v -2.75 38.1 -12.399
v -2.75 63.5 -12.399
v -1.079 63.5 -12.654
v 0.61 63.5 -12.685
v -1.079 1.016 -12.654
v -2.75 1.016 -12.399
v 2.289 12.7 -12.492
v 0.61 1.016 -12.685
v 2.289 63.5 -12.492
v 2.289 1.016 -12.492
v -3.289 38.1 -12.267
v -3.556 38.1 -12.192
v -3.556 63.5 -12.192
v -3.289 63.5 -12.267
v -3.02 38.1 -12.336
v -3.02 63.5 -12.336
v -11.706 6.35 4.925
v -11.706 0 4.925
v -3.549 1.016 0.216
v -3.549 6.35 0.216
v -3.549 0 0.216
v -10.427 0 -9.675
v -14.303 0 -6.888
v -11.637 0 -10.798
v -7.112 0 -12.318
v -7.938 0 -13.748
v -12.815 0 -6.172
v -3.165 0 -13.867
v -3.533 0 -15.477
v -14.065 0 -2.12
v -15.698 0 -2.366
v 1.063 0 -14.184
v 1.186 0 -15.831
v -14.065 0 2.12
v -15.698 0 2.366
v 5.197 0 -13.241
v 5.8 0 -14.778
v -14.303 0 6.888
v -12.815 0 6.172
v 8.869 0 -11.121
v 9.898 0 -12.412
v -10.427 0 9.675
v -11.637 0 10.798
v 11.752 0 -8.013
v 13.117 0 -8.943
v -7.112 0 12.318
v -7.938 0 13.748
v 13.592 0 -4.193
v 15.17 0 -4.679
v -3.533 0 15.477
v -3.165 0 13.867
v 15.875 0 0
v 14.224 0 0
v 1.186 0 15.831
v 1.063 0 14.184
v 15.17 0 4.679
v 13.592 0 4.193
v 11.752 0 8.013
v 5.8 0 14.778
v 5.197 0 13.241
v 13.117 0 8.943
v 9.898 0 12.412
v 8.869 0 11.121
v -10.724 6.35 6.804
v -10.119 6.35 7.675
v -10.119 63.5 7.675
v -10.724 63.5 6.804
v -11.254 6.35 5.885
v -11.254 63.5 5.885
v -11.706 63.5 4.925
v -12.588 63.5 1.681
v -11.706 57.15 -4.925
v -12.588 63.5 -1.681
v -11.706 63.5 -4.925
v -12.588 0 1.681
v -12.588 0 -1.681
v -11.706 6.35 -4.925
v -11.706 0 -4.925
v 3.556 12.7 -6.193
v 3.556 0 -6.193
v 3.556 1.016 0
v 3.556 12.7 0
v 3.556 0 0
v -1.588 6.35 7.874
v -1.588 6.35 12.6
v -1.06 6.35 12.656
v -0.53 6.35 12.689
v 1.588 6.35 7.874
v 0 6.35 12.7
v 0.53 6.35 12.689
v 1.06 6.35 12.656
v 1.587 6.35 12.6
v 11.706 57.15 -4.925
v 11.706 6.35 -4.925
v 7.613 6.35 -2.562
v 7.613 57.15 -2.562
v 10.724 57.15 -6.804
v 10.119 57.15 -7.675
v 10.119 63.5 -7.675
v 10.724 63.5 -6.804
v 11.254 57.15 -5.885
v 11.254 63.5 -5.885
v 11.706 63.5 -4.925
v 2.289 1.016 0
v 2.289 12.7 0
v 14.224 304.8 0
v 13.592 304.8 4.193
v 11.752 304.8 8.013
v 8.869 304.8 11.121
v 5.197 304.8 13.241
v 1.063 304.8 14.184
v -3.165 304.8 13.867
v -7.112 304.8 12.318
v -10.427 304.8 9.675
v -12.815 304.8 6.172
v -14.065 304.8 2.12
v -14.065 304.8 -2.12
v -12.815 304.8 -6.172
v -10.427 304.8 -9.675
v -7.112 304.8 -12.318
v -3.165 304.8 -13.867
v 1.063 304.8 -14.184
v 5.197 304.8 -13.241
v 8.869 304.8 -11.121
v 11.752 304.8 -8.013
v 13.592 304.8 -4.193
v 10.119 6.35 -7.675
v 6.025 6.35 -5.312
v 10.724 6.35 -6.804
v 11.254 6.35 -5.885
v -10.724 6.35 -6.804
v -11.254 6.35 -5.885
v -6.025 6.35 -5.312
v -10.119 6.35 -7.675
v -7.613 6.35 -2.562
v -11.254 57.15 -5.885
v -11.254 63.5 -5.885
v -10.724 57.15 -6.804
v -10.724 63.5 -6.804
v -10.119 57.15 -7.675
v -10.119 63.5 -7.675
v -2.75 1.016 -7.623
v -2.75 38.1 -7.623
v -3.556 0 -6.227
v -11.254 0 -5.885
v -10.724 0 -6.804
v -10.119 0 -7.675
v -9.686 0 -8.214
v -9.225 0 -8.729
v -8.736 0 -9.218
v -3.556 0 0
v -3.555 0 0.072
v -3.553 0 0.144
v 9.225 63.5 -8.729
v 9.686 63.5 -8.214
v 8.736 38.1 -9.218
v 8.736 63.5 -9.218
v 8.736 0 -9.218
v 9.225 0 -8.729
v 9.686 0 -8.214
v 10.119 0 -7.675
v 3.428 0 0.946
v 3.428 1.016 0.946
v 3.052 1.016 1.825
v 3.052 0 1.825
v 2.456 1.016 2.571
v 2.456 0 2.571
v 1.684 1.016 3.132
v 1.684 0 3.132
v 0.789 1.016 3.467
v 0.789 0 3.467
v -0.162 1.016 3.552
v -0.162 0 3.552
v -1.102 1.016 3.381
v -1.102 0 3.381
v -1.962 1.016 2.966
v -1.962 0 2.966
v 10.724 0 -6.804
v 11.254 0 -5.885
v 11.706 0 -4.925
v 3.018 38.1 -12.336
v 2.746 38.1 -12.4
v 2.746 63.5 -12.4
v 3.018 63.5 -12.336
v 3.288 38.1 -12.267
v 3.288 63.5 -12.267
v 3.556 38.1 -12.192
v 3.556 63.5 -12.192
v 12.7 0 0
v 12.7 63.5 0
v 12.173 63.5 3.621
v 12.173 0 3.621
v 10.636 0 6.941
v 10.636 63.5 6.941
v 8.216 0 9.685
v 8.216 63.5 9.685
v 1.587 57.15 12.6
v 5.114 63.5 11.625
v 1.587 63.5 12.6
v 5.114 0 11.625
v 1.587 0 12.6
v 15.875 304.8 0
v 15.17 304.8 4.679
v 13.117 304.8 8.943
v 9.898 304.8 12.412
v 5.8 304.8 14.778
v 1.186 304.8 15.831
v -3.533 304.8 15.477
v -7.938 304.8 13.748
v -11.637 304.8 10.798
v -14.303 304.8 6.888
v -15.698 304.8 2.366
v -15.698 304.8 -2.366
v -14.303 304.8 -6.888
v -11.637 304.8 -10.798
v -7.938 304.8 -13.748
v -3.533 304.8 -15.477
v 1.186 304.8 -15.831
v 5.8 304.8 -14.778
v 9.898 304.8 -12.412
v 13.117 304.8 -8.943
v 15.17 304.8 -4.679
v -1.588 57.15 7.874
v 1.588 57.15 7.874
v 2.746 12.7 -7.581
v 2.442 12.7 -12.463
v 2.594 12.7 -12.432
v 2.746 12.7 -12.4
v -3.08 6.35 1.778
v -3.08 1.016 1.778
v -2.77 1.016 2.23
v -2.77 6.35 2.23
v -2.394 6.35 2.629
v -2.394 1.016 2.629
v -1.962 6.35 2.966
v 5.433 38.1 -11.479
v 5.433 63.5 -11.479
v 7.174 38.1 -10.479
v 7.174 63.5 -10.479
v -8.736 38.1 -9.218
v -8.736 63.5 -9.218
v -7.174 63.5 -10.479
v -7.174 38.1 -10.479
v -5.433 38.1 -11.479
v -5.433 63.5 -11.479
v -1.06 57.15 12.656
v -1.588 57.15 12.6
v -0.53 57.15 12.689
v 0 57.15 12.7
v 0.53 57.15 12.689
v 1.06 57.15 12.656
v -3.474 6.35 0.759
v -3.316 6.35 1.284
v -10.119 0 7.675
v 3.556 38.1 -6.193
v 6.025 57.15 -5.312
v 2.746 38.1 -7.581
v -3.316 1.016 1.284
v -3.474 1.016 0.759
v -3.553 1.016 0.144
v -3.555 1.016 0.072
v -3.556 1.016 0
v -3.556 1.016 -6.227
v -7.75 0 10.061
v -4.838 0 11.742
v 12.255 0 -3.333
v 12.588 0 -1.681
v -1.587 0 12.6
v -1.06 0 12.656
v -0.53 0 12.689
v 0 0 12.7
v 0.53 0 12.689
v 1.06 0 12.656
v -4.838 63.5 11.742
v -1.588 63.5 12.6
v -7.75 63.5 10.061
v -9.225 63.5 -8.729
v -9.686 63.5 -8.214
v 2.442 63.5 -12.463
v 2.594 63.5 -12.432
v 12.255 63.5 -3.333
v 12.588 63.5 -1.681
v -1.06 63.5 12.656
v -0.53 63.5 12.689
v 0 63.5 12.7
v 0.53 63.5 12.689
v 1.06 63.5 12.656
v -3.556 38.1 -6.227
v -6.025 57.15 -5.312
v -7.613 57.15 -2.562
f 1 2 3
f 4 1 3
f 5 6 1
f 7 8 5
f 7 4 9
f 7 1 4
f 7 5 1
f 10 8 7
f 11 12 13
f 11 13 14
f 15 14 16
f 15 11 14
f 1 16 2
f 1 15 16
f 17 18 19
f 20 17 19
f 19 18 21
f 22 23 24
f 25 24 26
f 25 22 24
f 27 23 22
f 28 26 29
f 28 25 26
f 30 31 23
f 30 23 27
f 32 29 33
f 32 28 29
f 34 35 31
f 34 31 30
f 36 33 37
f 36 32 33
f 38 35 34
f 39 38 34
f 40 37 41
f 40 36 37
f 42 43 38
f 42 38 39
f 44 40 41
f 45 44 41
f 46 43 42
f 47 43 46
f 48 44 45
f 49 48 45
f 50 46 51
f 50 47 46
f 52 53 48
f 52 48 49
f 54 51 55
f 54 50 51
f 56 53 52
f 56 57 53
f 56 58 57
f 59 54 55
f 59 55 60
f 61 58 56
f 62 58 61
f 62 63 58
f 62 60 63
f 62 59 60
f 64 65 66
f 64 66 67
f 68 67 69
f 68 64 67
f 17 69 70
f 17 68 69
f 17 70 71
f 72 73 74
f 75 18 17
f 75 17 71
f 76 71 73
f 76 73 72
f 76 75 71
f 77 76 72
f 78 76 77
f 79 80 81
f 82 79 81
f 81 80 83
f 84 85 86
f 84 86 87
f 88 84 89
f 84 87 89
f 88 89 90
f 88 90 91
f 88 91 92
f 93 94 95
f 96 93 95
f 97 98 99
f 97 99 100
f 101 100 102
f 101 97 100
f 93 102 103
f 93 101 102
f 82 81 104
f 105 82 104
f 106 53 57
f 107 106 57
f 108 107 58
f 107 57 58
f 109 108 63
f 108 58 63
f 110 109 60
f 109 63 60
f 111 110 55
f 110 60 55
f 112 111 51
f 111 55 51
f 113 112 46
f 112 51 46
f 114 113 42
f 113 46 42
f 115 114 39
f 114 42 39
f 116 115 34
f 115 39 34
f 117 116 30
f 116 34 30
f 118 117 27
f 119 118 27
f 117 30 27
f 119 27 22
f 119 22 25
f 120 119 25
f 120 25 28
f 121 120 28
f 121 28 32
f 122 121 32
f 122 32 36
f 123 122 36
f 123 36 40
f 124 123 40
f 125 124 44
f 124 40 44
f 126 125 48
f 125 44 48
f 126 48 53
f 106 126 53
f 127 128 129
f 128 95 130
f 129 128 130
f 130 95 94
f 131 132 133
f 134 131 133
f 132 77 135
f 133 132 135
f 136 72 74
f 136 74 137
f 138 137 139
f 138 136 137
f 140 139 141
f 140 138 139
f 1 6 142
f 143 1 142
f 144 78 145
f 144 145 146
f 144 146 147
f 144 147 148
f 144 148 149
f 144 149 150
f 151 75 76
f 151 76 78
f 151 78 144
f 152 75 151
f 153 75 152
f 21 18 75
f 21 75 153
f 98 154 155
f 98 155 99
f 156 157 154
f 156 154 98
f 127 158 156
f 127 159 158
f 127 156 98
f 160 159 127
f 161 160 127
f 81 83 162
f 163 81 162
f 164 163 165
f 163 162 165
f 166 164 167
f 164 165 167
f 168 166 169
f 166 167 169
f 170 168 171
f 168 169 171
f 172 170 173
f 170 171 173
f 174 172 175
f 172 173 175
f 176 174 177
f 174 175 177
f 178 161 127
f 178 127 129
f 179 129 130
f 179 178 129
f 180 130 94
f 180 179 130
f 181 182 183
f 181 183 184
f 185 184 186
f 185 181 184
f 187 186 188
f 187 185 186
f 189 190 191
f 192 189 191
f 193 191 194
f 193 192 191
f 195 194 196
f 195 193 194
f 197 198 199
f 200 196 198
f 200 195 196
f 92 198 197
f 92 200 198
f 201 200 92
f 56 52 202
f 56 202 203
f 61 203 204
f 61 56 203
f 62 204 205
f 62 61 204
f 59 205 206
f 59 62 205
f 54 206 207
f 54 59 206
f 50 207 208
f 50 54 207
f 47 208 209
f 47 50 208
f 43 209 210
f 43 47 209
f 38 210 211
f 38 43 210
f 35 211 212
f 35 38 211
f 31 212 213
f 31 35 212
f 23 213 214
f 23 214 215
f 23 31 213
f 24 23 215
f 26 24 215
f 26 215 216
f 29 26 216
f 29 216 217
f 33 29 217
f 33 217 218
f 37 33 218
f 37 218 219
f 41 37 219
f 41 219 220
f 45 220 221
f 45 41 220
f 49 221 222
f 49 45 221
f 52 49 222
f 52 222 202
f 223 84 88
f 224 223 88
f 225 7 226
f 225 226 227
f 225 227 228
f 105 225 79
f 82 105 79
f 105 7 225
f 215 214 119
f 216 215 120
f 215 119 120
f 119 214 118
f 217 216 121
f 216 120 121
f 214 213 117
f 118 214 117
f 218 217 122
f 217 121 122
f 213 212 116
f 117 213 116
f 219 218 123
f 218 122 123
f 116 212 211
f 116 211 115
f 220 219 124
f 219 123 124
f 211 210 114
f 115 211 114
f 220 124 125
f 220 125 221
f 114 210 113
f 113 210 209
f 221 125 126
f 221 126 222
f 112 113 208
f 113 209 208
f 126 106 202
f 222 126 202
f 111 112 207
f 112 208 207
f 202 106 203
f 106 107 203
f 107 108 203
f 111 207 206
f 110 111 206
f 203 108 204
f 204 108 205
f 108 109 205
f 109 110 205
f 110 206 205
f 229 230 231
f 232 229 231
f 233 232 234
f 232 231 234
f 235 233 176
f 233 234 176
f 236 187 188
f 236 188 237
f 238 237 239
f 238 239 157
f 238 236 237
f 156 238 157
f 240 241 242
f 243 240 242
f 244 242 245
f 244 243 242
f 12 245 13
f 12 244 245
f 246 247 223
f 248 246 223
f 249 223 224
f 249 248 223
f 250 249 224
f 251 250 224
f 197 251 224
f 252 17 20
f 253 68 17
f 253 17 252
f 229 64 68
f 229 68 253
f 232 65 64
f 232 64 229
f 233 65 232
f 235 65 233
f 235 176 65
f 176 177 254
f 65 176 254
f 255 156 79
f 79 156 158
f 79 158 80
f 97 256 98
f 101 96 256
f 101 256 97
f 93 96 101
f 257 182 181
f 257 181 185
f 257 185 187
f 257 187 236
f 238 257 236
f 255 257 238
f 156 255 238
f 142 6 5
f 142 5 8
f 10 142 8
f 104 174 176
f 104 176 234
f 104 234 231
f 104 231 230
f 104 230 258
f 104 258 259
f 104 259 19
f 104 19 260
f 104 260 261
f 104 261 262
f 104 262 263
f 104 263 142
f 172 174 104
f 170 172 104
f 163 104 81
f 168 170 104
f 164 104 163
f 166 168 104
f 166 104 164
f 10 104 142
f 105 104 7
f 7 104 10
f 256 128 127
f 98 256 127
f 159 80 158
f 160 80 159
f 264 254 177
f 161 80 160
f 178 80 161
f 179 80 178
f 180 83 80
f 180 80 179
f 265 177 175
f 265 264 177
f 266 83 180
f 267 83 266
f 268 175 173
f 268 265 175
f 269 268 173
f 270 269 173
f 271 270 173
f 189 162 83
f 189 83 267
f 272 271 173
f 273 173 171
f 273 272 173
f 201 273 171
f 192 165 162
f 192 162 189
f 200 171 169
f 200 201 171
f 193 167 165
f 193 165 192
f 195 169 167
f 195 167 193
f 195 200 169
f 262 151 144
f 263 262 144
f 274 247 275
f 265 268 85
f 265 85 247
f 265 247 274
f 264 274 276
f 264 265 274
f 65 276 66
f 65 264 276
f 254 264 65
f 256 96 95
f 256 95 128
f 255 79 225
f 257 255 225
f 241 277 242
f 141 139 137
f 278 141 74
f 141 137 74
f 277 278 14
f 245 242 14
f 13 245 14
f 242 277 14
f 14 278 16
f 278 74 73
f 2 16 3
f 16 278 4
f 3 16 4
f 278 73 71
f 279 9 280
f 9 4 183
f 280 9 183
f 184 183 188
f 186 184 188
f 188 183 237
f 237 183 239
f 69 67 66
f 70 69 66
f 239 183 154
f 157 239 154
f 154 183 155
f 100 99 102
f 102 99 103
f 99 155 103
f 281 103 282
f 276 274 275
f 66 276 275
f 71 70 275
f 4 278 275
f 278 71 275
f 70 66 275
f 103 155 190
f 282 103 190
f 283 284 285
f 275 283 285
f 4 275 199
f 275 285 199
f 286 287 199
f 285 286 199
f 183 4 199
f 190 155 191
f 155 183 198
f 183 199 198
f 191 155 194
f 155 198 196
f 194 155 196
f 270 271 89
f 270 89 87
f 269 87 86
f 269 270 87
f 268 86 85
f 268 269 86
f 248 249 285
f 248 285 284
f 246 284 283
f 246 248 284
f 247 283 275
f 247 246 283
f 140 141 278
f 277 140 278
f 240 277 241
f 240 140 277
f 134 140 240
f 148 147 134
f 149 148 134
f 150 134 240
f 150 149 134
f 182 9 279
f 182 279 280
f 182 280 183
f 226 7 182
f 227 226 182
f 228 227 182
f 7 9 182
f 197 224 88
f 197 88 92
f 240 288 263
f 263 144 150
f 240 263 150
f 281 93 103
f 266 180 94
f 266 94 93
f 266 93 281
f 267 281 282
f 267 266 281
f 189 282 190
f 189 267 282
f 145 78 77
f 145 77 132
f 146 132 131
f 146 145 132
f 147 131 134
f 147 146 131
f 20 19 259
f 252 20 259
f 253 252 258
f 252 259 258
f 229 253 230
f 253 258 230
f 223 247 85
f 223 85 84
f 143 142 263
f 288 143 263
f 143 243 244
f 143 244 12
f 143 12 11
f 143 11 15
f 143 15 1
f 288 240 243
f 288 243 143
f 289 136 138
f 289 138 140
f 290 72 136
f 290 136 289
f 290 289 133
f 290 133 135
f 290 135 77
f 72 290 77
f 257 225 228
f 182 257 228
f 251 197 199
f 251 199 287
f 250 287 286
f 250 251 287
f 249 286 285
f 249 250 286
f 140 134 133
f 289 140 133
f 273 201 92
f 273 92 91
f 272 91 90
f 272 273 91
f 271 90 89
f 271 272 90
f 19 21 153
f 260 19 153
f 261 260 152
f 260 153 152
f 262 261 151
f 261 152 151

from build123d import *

# Parameters (mm, degrees)
F0_R     = 15.875
F0_R_2   = 14.224
F1_DEPTH = 304.8
F3_DEPTH = 63.5
F4_DEPTH = 57.15
F5_DEPTH = 6.35
F6_DEPTH = 1.016
F7_DEPTH = 6.35
F8_DEPTH = 12.7
F9_DEPTH = 38.1


with BuildPart() as f1:
    # F0 (on Front) → F1 (new body)
    with BuildSketch(Plane.XZ):
        Circle(F0_R)
        Circle(F0_R_2, mode=Mode.SUBTRACT)
    extrude(amount=-F1_DEPTH)


with BuildPart() as f3:
    # F2 (on Front) → F3 (new body)
    with BuildSketch(Plane.XZ):
        with BuildLine():
            ThreePointArc((-1.5875, 12.6003906189), (-6.35, 10.9985226281), (-10.1185083736, 7.675010638))
            Line((-10.1185083736, 7.675010638), (-1.961923205, 2.9658039952))
            ThreePointArc((-1.961923205, 2.9658039952), (1.6835285984, 3.1322304287), (3.556, 0))
            Line((3.556, 0), (3.556, -6.1934164615))
            Line((3.556, -6.1934164615), (8.73648468, -9.2175829498))
            ThreePointArc((8.73648468, -9.2175829498), (9.4589942963, -8.4745163226), (10.1185083736, -7.675010638))
            Line((10.1185083736, -7.675010638), (6.0253340294, -5.3118153285))
            Line((6.0253340294, -5.3118153285), (6.8190840294, -3.937))
            Line((6.8190840294, -3.937), (7.6128340294, -2.5621846715))
            Line((7.6128340294, -2.5621846715), (11.7060083736, -4.925379981))
            ThreePointArc((11.7060083736, -4.925379981), (12.4490221774, -2.5123389157), (12.7, 0))
            ThreePointArc((12.7, 0), (9.525, 8.4002604126), (1.5875, 12.6003906189))
            Line((1.5875, 12.6003906189), (1.5875, 7.874))
            Line((1.5875, 7.874), (0, 7.874))
            Line((0, 7.874), (-1.5875, 7.874))
            Line((-1.5875, 7.874), (-1.5875, 12.6003906189))
        make_face()
        with BuildLine():
            Line((2.289300086, 0), (2.9718, 0))
            ThreePointArc((2.9718, 0), (1.5370065953, 2.5434633801), (-1.3819290302, 2.6309442023))
            ThreePointArc((-1.3819290302, 2.6309442023), (-2.0589903878, 2.1429311289), (-2.573654295, 1.4859))
            ThreePointArc((-2.573654295, 1.4859), (-2.88532799, 0.7116724175), (-2.9694290302, -0.1186864547))
            ThreePointArc((-2.9694290302, -0.1186864547), (-2.314837262, -1.8636318549), (-0.7498571067, -2.8756407216))
            Line((-0.7498571067, -2.8756407216), (-0.7498571067, -2.1556231659))
            Line((-0.7498571067, -2.1556231659), (0, -2.1556231659))
            Line((0, -2.1556231659), (0.7676830282, -2.1556231659))
            Line((0.7676830282, -2.1556231659), (0.7676830282, -2.8709332991))
            ThreePointArc((0.7676830282, -2.8709332991), (1.6045060587, -2.5014307002), (2.289300086, -1.8949143401))
            Line((2.289300086, -1.8949143401), (2.289300086, 0))
        make_face()
        with BuildLine():
            ThreePointArc((0.7676830282, -3.4721461329), (0.0091230678, -3.5559882972), (-0.7498571067, -3.4760394589))
            Line((-0.7498571067, -3.4760394589), (-0.7498571067, -5.3360266611))
            Line((-0.7498571067, -5.3360266611), (0, -5.3360266611))
            Line((0, -5.3360266611), (0.7676830282, -5.3360266611))
            Line((0.7676830282, -5.3360266611), (0.7676830282, -3.4721461329))
        make_face()
        with BuildLine():
            Line((-0.7498571067, -2.1556231659), (-0.7498571067, -2.8756407216))
            ThreePointArc((-0.7498571067, -2.8756407216), (0.0092185045, -2.9717857021), (0.7676830282, -2.8709332991))
            Line((0.7676830282, -2.8709332991), (0.7676830282, -2.1556231659))
            Line((0.7676830282, -2.1556231659), (0, -2.1556231659))
            Line((0, -2.1556231659), (-0.7498571067, -2.1556231659))
        make_face()
        with BuildLine():
            Line((3.556, -6.1934164615), (3.556, 0))
            ThreePointArc((3.556, 0), (3.223808858, -1.5007306378), (2.289300086, -2.7210735228))
            Line((2.289300086, -2.7210735228), (2.289300086, -12.49196162))
            ThreePointArc((2.289300086, -12.49196162), (2.5180894599, -12.4478602769), (2.7460312559, -12.3995690385))
            Line((2.7460312559, -12.3995690385), (2.7460312559, -7.5809163515))
            Line((2.7460312559, -7.5809163515), (3.556, -6.1934164615))
        make_face()
        with BuildLine():
            Line((-7.6128340294, -2.5621846715), (-11.7060083736, -4.925379981))
            ThreePointArc((-11.7060083736, -4.925379981), (-10.9985226281, -6.35), (-10.1185083736, -7.675010638))
            Line((-10.1185083736, -7.675010638), (-6.0253340294, -5.3118153285))
            Line((-6.0253340294, -5.3118153285), (-6.8190840294, -3.937))
            Line((-6.8190840294, -3.937), (-7.6128340294, -2.5621846715))
        make_face()
        with BuildLine():
            ThreePointArc((1.5875, 12.6003906189), (0.7953109893, 12.6750731923), (0, 12.7))
            Line((0, 12.7), (0, 7.874))
            Line((0, 7.874), (1.5875, 7.874))
            Line((1.5875, 7.874), (1.5875, 12.6003906189))
        make_face()
        with BuildLine():
            ThreePointArc((0, 12.7), (-0.7953109893, 12.6750731923), (-1.5875, 12.6003906189))
            Line((-1.5875, 12.6003906189), (-1.5875, 7.874))
            Line((-1.5875, 7.874), (0, 7.874))
            Line((0, 7.874), (0, 12.7))
        make_face()
        with BuildLine():
            ThreePointArc((10.1185083736, -7.675010638), (10.9985226281, -6.35), (11.7060083736, -4.925379981))
            Line((11.7060083736, -4.925379981), (7.6128340294, -2.5621846715))
            Line((7.6128340294, -2.5621846715), (6.8190840294, -3.937))
            Line((6.8190840294, -3.937), (6.0253340294, -5.3118153285))
            Line((6.0253340294, -5.3118153285), (10.1185083736, -7.675010638))
        make_face()
        with BuildLine():
            Line((-1.961923205, 2.9658039952), (-10.1185083736, 7.675010638))
            ThreePointArc((-10.1185083736, 7.675010638), (-10.9985226281, 6.35), (-11.7060083736, 4.925379981))
            Line((-11.7060083736, 4.925379981), (-3.549423205, 0.2161733382))
            ThreePointArc((-3.549423205, 0.2161733382), (-3.4052558646, 1.0243868881), (-3.0795863359, 1.778))
            ThreePointArc((-3.0795863359, 1.778), (-2.5897730007, 2.4368446411), (-1.961923205, 2.9658039952))
        make_face()
        with BuildLine():
            ThreePointArc((3.556, 0), (1.6835285984, 3.1322304287), (-1.961923205, 2.9658039952))
            Line((-1.961923205, 2.9658039952), (-1.779904295, 2.8607153285))
            Line((-1.779904295, 2.8607153285), (-1.3819290302, 2.6309442023))
            ThreePointArc((-1.3819290302, 2.6309442023), (1.5370065953, 2.5434633801), (2.9718, 0))
            Line((2.9718, 0), (3.556, 0))
        make_face()
        with BuildLine():
            Line((-1.779904295, 2.8607153285), (-1.961923205, 2.9658039952))
            ThreePointArc((-1.961923205, 2.9658039952), (-2.5897730007, 2.4368446411), (-3.0795863359, 1.778))
            Line((-3.0795863359, 1.778), (-2.573654295, 1.4859))
            ThreePointArc((-2.573654295, 1.4859), (-2.0589903878, 2.1429311289), (-1.3819290302, 2.6309442023))
            Line((-1.3819290302, 2.6309442023), (-1.779904295, 2.8607153285))
        make_face()
        with BuildLine():
            ThreePointArc((-3.0795863359, 1.778), (-3.4052558646, 1.0243868881), (-3.549423205, 0.2161733382))
            Line((-3.549423205, 0.2161733382), (-3.367404295, 0.1110846715))
            Line((-3.367404295, 0.1110846715), (-2.9694290302, -0.1186864547))
            ThreePointArc((-2.9694290302, -0.1186864547), (-2.88532799, 0.7116724175), (-2.573654295, 1.4859))
            Line((-2.573654295, 1.4859), (-3.0795863359, 1.778))
        make_face()
        with BuildLine():
            Line((-3.367404295, 0.1110846715), (-3.549423205, 0.2161733382))
            ThreePointArc((-3.549423205, 0.2161733382), (-3.5543554209, 0.1081366801), (-3.556, 0))
            ThreePointArc((-3.556, 0), (-2.766914154, -2.2336790424), (-0.7498571067, -3.4760394589))
            Line((-0.7498571067, -3.4760394589), (-0.7498571067, -2.8756407216))
            ThreePointArc((-0.7498571067, -2.8756407216), (-2.314837262, -1.8636318549), (-2.9694290302, -0.1186864547))
            Line((-2.9694290302, -0.1186864547), (-3.367404295, 0.1110846715))
        make_face()
        with BuildLine():
            Line((-0.7498571067, -2.8756407216), (-0.7498571067, -3.4760394589))
            ThreePointArc((-0.7498571067, -3.4760394589), (0.0091230678, -3.5559882972), (0.7676830282, -3.4721461329))
            Line((0.7676830282, -3.4721461329), (0.7676830282, -2.8709332991))
            ThreePointArc((0.7676830282, -2.8709332991), (0.0092185045, -2.9717857021), (-0.7498571067, -2.8756407216))
        make_face()
        with BuildLine():
            Line((-3.549423205, 0.2161733382), (-11.7060083736, 4.925379981))
            ThreePointArc((-11.7060083736, 4.925379981), (-12.7, 0), (-11.7060083736, -4.925379981))
            Line((-11.7060083736, -4.925379981), (-7.6128340294, -2.5621846715))
            Line((-7.6128340294, -2.5621846715), (-6.8190840294, -3.937))
            Line((-6.8190840294, -3.937), (-6.0253340294, -5.3118153285))
            Line((-6.0253340294, -5.3118153285), (-10.1185083736, -7.675010638))
            ThreePointArc((-10.1185083736, -7.675010638), (-9.4589942963, -8.4745163226), (-8.73648468, -9.2175829498))
            Line((-8.73648468, -9.2175829498), (-3.556, -6.2266287252))
            Line((-3.556, -6.2266287252), (-3.556, 0))
            ThreePointArc((-3.556, 0), (-3.5543554209, 0.1081366801), (-3.549423205, 0.2161733382))
        make_face()
        with BuildLine():
            ThreePointArc((2.289300086, -1.8949143401), (2.795973644, -1.0070385406), (2.9718, 0))
            Line((2.9718, 0), (2.289300086, 0))
            Line((2.289300086, 0), (2.289300086, -1.8949143401))
        make_face()
        with BuildLine():
            ThreePointArc((2.289300086, -2.7210735228), (3.223808858, -1.5007306378), (3.556, 0))
            Line((3.556, 0), (2.9718, 0))
            ThreePointArc((2.9718, 0), (2.795973644, -1.0070385406), (2.289300086, -1.8949143401))
            Line((2.289300086, -1.8949143401), (2.289300086, -2.7210735228))
        make_face()
        with BuildLine():
            ThreePointArc((0.7676830282, -3.4721461329), (1.5739485241, -3.1887022507), (2.289300086, -2.7210735228))
            Line((2.289300086, -2.7210735228), (2.289300086, -1.8949143401))
            ThreePointArc((2.289300086, -1.8949143401), (1.6045060587, -2.5014307002), (0.7676830282, -2.8709332991))
            Line((0.7676830282, -2.8709332991), (0.7676830282, -3.4721461329))
        make_face()
        with BuildLine():
            ThreePointArc((-0.7498571067, -3.4760394589), (-2.766914154, -2.2336790424), (-3.556, 0))
            Line((-3.556, 0), (-3.556, -6.2266287252))
            Line((-3.556, -6.2266287252), (-2.7499526441, -7.622743699))
            Line((-2.7499526441, -7.622743699), (-2.7499526441, -12.3986999502))
            ThreePointArc((-2.7499526441, -12.3986999502), (-0.2349992119, -12.6978256158), (2.289300086, -12.49196162))
            Line((2.289300086, -12.49196162), (2.289300086, -2.7210735228))
            ThreePointArc((2.289300086, -2.7210735228), (1.5739485241, -3.1887022507), (0.7676830282, -3.4721461329))
            Line((0.7676830282, -3.4721461329), (0.7676830282, -5.3360266611))
            Line((0.7676830282, -5.3360266611), (0, -5.3360266611))
            Line((0, -5.3360266611), (-0.7498571067, -5.3360266611))
            Line((-0.7498571067, -5.3360266611), (-0.7498571067, -3.4760394589))
        make_face()
        with BuildLine():
            Line((-3.556, -6.2266287252), (-8.73648468, -9.2175829498))
            ThreePointArc((-8.73648468, -9.2175829498), (-6.3236132155, -11.0137149001), (-3.556, -12.192))
            Line((-3.556, -12.192), (-3.556, -8.088115357))
            Line((-3.556, -8.088115357), (-3.556, -6.2266287252))
        make_face()
        with BuildLine():
            Line((-3.556, -8.088115357), (-3.556, -12.192))
            ThreePointArc((-3.556, -12.192), (-3.1546696982, -12.3019534666), (-2.7499526441, -12.3986999502))
            Line((-2.7499526441, -12.3986999502), (-2.7499526441, -7.622743699))
            Line((-2.7499526441, -7.622743699), (-3.556, -8.088115357))
        make_face()
        Polygon((-2.7499526441, -7.622743699), (-3.556, -6.2266287252), (-3.556, -8.088115357), align=None)
        Polygon((3.556, -8.0537447611), (3.556, -6.1934164615), (2.7460312559, -7.5809163515), align=None)
        with BuildLine():
            Line((3.556, -12.192), (3.556, -8.0537447611))
            Line((3.556, -8.0537447611), (2.7460312559, -7.5809163515))
            Line((2.7460312559, -7.5809163515), (2.7460312559, -12.3995690385))
            ThreePointArc((2.7460312559, -12.3995690385), (3.1527243321, -12.3024521656), (3.556, -12.192))
        make_face()
        with BuildLine():
            Line((8.73648468, -9.2175829498), (3.556, -6.1934164615))
            Line((3.556, -6.1934164615), (3.556, -8.0537447611))
            Line((3.556, -8.0537447611), (3.556, -12.192))
            ThreePointArc((3.556, -12.192), (6.3236132155, -11.0137149001), (8.73648468, -9.2175829498))
        make_face()
    extrude(amount=-F3_DEPTH)

    # F2 (on Front) → F4 (cut)
    with BuildSketch(Plane.XZ):
        with BuildLine():
            ThreePointArc((0, 12.7), (-0.7953109893, 12.6750731923), (-1.5875, 12.6003906189))
            Line((-1.5875, 12.6003906189), (-1.5875, 7.874))
            Line((-1.5875, 7.874), (0, 7.874))
            Line((0, 7.874), (0, 12.7))
        make_face()
        with BuildLine():
            ThreePointArc((1.5875, 12.6003906189), (0.7953109893, 12.6750731923), (0, 12.7))
            Line((0, 12.7), (0, 7.874))
            Line((0, 7.874), (1.5875, 7.874))
            Line((1.5875, 7.874), (1.5875, 12.6003906189))
        make_face()
        with BuildLine():
            Line((-7.6128340294, -2.5621846715), (-11.7060083736, -4.925379981))
            ThreePointArc((-11.7060083736, -4.925379981), (-10.9985226281, -6.35), (-10.1185083736, -7.675010638))
            Line((-10.1185083736, -7.675010638), (-6.0253340294, -5.3118153285))
            Line((-6.0253340294, -5.3118153285), (-6.8190840294, -3.937))
            Line((-6.8190840294, -3.937), (-7.6128340294, -2.5621846715))
        make_face()
        with BuildLine():
            ThreePointArc((10.1185083736, -7.675010638), (10.9985226281, -6.35), (11.7060083736, -4.925379981))
            Line((11.7060083736, -4.925379981), (7.6128340294, -2.5621846715))
            Line((7.6128340294, -2.5621846715), (6.8190840294, -3.937))
            Line((6.8190840294, -3.937), (6.0253340294, -5.3118153285))
            Line((6.0253340294, -5.3118153285), (10.1185083736, -7.675010638))
        make_face()
    extrude(amount=-F4_DEPTH, mode=Mode.SUBTRACT)

    # F2 (on Front) → F5 (join)
    with BuildSketch(Plane.XZ):
        with BuildLine():
            ThreePointArc((0, 12.7), (-0.7953109893, 12.6750731923), (-1.5875, 12.6003906189))
            Line((-1.5875, 12.6003906189), (-1.5875, 7.874))
            Line((-1.5875, 7.874), (0, 7.874))
            Line((0, 7.874), (0, 12.7))
        make_face()
        with BuildLine():
            ThreePointArc((1.5875, 12.6003906189), (0.7953109893, 12.6750731923), (0, 12.7))
            Line((0, 12.7), (0, 7.874))
            Line((0, 7.874), (1.5875, 7.874))
            Line((1.5875, 7.874), (1.5875, 12.6003906189))
        make_face()
        with BuildLine():
            Line((-7.6128340294, -2.5621846715), (-11.7060083736, -4.925379981))
            ThreePointArc((-11.7060083736, -4.925379981), (-10.9985226281, -6.35), (-10.1185083736, -7.675010638))
            Line((-10.1185083736, -7.675010638), (-6.0253340294, -5.3118153285))
            Line((-6.0253340294, -5.3118153285), (-6.8190840294, -3.937))
            Line((-6.8190840294, -3.937), (-7.6128340294, -2.5621846715))
        make_face()
        with BuildLine():
            ThreePointArc((10.1185083736, -7.675010638), (10.9985226281, -6.35), (11.7060083736, -4.925379981))
            Line((11.7060083736, -4.925379981), (7.6128340294, -2.5621846715))
            Line((7.6128340294, -2.5621846715), (6.8190840294, -3.937))
            Line((6.8190840294, -3.937), (6.0253340294, -5.3118153285))
            Line((6.0253340294, -5.3118153285), (10.1185083736, -7.675010638))
        make_face()
    extrude(amount=-F5_DEPTH)

    # F2 (on Front) → F6 (cut)
    with BuildSketch(Plane.XZ):
        with BuildLine():
            Line((3.556, -6.1934164615), (3.556, 0))
            ThreePointArc((3.556, 0), (3.223808858, -1.5007306378), (2.289300086, -2.7210735228))
            Line((2.289300086, -2.7210735228), (2.289300086, -12.49196162))
            ThreePointArc((2.289300086, -12.49196162), (2.5180894599, -12.4478602769), (2.7460312559, -12.3995690385))
            Line((2.7460312559, -12.3995690385), (2.7460312559, -7.5809163515))
            Line((2.7460312559, -7.5809163515), (3.556, -6.1934164615))
        make_face()
        with BuildLine():
            Line((2.289300086, 0), (2.9718, 0))
            ThreePointArc((2.9718, 0), (1.5370065953, 2.5434633801), (-1.3819290302, 2.6309442023))
            ThreePointArc((-1.3819290302, 2.6309442023), (-2.0589903878, 2.1429311289), (-2.573654295, 1.4859))
            ThreePointArc((-2.573654295, 1.4859), (-2.88532799, 0.7116724175), (-2.9694290302, -0.1186864547))
            ThreePointArc((-2.9694290302, -0.1186864547), (-2.314837262, -1.8636318549), (-0.7498571067, -2.8756407216))
            Line((-0.7498571067, -2.8756407216), (-0.7498571067, -2.1556231659))
            Line((-0.7498571067, -2.1556231659), (0, -2.1556231659))
            Line((0, -2.1556231659), (0.7676830282, -2.1556231659))
            Line((0.7676830282, -2.1556231659), (0.7676830282, -2.8709332991))
            ThreePointArc((0.7676830282, -2.8709332991), (1.6045060587, -2.5014307002), (2.289300086, -1.8949143401))
            Line((2.289300086, -1.8949143401), (2.289300086, 0))
        make_face()
        with BuildLine():
            ThreePointArc((0.7676830282, -3.4721461329), (0.0091230678, -3.5559882972), (-0.7498571067, -3.4760394589))
            Line((-0.7498571067, -3.4760394589), (-0.7498571067, -5.3360266611))
            Line((-0.7498571067, -5.3360266611), (0, -5.3360266611))
            Line((0, -5.3360266611), (0.7676830282, -5.3360266611))
            Line((0.7676830282, -5.3360266611), (0.7676830282, -3.4721461329))
        make_face()
        with BuildLine():
            Line((-0.7498571067, -2.1556231659), (-0.7498571067, -2.8756407216))
            ThreePointArc((-0.7498571067, -2.8756407216), (0.0092185045, -2.9717857021), (0.7676830282, -2.8709332991))
            Line((0.7676830282, -2.8709332991), (0.7676830282, -2.1556231659))
            Line((0.7676830282, -2.1556231659), (0, -2.1556231659))
            Line((0, -2.1556231659), (-0.7498571067, -2.1556231659))
        make_face()
        with BuildLine():
            Line((-3.367404295, 0.1110846715), (-3.549423205, 0.2161733382))
            ThreePointArc((-3.549423205, 0.2161733382), (-3.5543554209, 0.1081366801), (-3.556, 0))
            ThreePointArc((-3.556, 0), (-2.766914154, -2.2336790424), (-0.7498571067, -3.4760394589))
            Line((-0.7498571067, -3.4760394589), (-0.7498571067, -2.8756407216))
            ThreePointArc((-0.7498571067, -2.8756407216), (-2.314837262, -1.8636318549), (-2.9694290302, -0.1186864547))
            Line((-2.9694290302, -0.1186864547), (-3.367404295, 0.1110846715))
        make_face()
        with BuildLine():
            Line((-0.7498571067, -2.8756407216), (-0.7498571067, -3.4760394589))
            ThreePointArc((-0.7498571067, -3.4760394589), (0.0091230678, -3.5559882972), (0.7676830282, -3.4721461329))
            Line((0.7676830282, -3.4721461329), (0.7676830282, -2.8709332991))
            ThreePointArc((0.7676830282, -2.8709332991), (0.0092185045, -2.9717857021), (-0.7498571067, -2.8756407216))
        make_face()
        with BuildLine():
            ThreePointArc((3.556, 0), (1.6835285984, 3.1322304287), (-1.961923205, 2.9658039952))
            Line((-1.961923205, 2.9658039952), (-1.779904295, 2.8607153285))
            Line((-1.779904295, 2.8607153285), (-1.3819290302, 2.6309442023))
            ThreePointArc((-1.3819290302, 2.6309442023), (1.5370065953, 2.5434633801), (2.9718, 0))
            Line((2.9718, 0), (3.556, 0))
        make_face()
        with BuildLine():
            Line((-1.779904295, 2.8607153285), (-1.961923205, 2.9658039952))
            ThreePointArc((-1.961923205, 2.9658039952), (-2.5897730007, 2.4368446411), (-3.0795863359, 1.778))
            Line((-3.0795863359, 1.778), (-2.573654295, 1.4859))
            ThreePointArc((-2.573654295, 1.4859), (-2.0589903878, 2.1429311289), (-1.3819290302, 2.6309442023))
            Line((-1.3819290302, 2.6309442023), (-1.779904295, 2.8607153285))
        make_face()
        with BuildLine():
            ThreePointArc((-3.0795863359, 1.778), (-3.4052558646, 1.0243868881), (-3.549423205, 0.2161733382))
            Line((-3.549423205, 0.2161733382), (-3.367404295, 0.1110846715))
            Line((-3.367404295, 0.1110846715), (-2.9694290302, -0.1186864547))
            ThreePointArc((-2.9694290302, -0.1186864547), (-2.88532799, 0.7116724175), (-2.573654295, 1.4859))
            Line((-2.573654295, 1.4859), (-3.0795863359, 1.778))
        make_face()
        with BuildLine():
            ThreePointArc((2.289300086, -1.8949143401), (2.795973644, -1.0070385406), (2.9718, 0))
            Line((2.9718, 0), (2.289300086, 0))
            Line((2.289300086, 0), (2.289300086, -1.8949143401))
        make_face()
        with BuildLine():
            ThreePointArc((2.289300086, -2.7210735228), (3.223808858, -1.5007306378), (3.556, 0))
            Line((3.556, 0), (2.9718, 0))
            ThreePointArc((2.9718, 0), (2.795973644, -1.0070385406), (2.289300086, -1.8949143401))
            Line((2.289300086, -1.8949143401), (2.289300086, -2.7210735228))
        make_face()
        with BuildLine():
            ThreePointArc((0.7676830282, -3.4721461329), (1.5739485241, -3.1887022507), (2.289300086, -2.7210735228))
            Line((2.289300086, -2.7210735228), (2.289300086, -1.8949143401))
            ThreePointArc((2.289300086, -1.8949143401), (1.6045060587, -2.5014307002), (0.7676830282, -2.8709332991))
            Line((0.7676830282, -2.8709332991), (0.7676830282, -3.4721461329))
        make_face()
        with BuildLine():
            ThreePointArc((-0.7498571067, -3.4760394589), (-2.766914154, -2.2336790424), (-3.556, 0))
            Line((-3.556, 0), (-3.556, -6.2266287252))
            Line((-3.556, -6.2266287252), (-2.7499526441, -7.622743699))
            Line((-2.7499526441, -7.622743699), (-2.7499526441, -12.3986999502))
            ThreePointArc((-2.7499526441, -12.3986999502), (-0.2349992119, -12.6978256158), (2.289300086, -12.49196162))
            Line((2.289300086, -12.49196162), (2.289300086, -2.7210735228))
            ThreePointArc((2.289300086, -2.7210735228), (1.5739485241, -3.1887022507), (0.7676830282, -3.4721461329))
            Line((0.7676830282, -3.4721461329), (0.7676830282, -5.3360266611))
            Line((0.7676830282, -5.3360266611), (0, -5.3360266611))
            Line((0, -5.3360266611), (-0.7498571067, -5.3360266611))
            Line((-0.7498571067, -5.3360266611), (-0.7498571067, -3.4760394589))
        make_face()
    extrude(amount=-F6_DEPTH, mode=Mode.SUBTRACT)

    # F2 (on Front) → F7 (cut)
    with BuildSketch(Plane.XZ):
        with BuildLine():
            Line((-1.961923205, 2.9658039952), (-10.1185083736, 7.675010638))
            ThreePointArc((-10.1185083736, 7.675010638), (-10.9985226281, 6.35), (-11.7060083736, 4.925379981))
            Line((-11.7060083736, 4.925379981), (-3.549423205, 0.2161733382))
            ThreePointArc((-3.549423205, 0.2161733382), (-3.4052558646, 1.0243868881), (-3.0795863359, 1.778))
            ThreePointArc((-3.0795863359, 1.778), (-2.5897730007, 2.4368446411), (-1.961923205, 2.9658039952))
        make_face()
    extrude(amount=-F7_DEPTH, mode=Mode.SUBTRACT)

    # F2 (on Front) → F8 (cut)
    with BuildSketch(Plane.XZ):
        with BuildLine():
            ThreePointArc((2.289300086, -1.8949143401), (2.795973644, -1.0070385406), (2.9718, 0))
            Line((2.9718, 0), (2.289300086, 0))
            Line((2.289300086, 0), (2.289300086, -1.8949143401))
        make_face()
        with BuildLine():
            ThreePointArc((2.289300086, -2.7210735228), (3.223808858, -1.5007306378), (3.556, 0))
            Line((3.556, 0), (2.9718, 0))
            ThreePointArc((2.9718, 0), (2.795973644, -1.0070385406), (2.289300086, -1.8949143401))
            Line((2.289300086, -1.8949143401), (2.289300086, -2.7210735228))
        make_face()
        with BuildLine():
            Line((3.556, -6.1934164615), (3.556, 0))
            ThreePointArc((3.556, 0), (3.223808858, -1.5007306378), (2.289300086, -2.7210735228))
            Line((2.289300086, -2.7210735228), (2.289300086, -12.49196162))
            ThreePointArc((2.289300086, -12.49196162), (2.5180894599, -12.4478602769), (2.7460312559, -12.3995690385))
            Line((2.7460312559, -12.3995690385), (2.7460312559, -7.5809163515))
            Line((2.7460312559, -7.5809163515), (3.556, -6.1934164615))
        make_face()
    extrude(amount=-F8_DEPTH, mode=Mode.SUBTRACT)

    # F2 (on Front) → F9 (cut)
    with BuildSketch(Plane.XZ):
        with BuildLine():
            Line((-3.556, -6.2266287252), (-8.73648468, -9.2175829498))
            ThreePointArc((-8.73648468, -9.2175829498), (-6.3236132155, -11.0137149001), (-3.556, -12.192))
            Line((-3.556, -12.192), (-3.556, -8.088115357))
            Line((-3.556, -8.088115357), (-3.556, -6.2266287252))
        make_face()
        Polygon((-2.7499526441, -7.622743699), (-3.556, -6.2266287252), (-3.556, -8.088115357), align=None)
        with BuildLine():
            Line((-3.556, -8.088115357), (-3.556, -12.192))
            ThreePointArc((-3.556, -12.192), (-3.1546696982, -12.3019534666), (-2.7499526441, -12.3986999502))
            Line((-2.7499526441, -12.3986999502), (-2.7499526441, -7.622743699))
            Line((-2.7499526441, -7.622743699), (-3.556, -8.088115357))
        make_face()
        Polygon((3.556, -8.0537447611), (3.556, -6.1934164615), (2.7460312559, -7.5809163515), align=None)
        with BuildLine():
            Line((3.556, -12.192), (3.556, -8.0537447611))
            Line((3.556, -8.0537447611), (2.7460312559, -7.5809163515))
            Line((2.7460312559, -7.5809163515), (2.7460312559, -12.3995690385))
            ThreePointArc((2.7460312559, -12.3995690385), (3.1527243321, -12.3024521656), (3.556, -12.192))
        make_face()
        with BuildLine():
            Line((8.73648468, -9.2175829498), (3.556, -6.1934164615))
            Line((3.556, -6.1934164615), (3.556, -8.0537447611))
            Line((3.556, -8.0537447611), (3.556, -12.192))
            ThreePointArc((3.556, -12.192), (6.3236132155, -11.0137149001), (8.73648468, -9.2175829498))
        make_face()
    extrude(amount=-F9_DEPTH, mode=Mode.SUBTRACT)


solid = Compound([f1.part, f3.part])
